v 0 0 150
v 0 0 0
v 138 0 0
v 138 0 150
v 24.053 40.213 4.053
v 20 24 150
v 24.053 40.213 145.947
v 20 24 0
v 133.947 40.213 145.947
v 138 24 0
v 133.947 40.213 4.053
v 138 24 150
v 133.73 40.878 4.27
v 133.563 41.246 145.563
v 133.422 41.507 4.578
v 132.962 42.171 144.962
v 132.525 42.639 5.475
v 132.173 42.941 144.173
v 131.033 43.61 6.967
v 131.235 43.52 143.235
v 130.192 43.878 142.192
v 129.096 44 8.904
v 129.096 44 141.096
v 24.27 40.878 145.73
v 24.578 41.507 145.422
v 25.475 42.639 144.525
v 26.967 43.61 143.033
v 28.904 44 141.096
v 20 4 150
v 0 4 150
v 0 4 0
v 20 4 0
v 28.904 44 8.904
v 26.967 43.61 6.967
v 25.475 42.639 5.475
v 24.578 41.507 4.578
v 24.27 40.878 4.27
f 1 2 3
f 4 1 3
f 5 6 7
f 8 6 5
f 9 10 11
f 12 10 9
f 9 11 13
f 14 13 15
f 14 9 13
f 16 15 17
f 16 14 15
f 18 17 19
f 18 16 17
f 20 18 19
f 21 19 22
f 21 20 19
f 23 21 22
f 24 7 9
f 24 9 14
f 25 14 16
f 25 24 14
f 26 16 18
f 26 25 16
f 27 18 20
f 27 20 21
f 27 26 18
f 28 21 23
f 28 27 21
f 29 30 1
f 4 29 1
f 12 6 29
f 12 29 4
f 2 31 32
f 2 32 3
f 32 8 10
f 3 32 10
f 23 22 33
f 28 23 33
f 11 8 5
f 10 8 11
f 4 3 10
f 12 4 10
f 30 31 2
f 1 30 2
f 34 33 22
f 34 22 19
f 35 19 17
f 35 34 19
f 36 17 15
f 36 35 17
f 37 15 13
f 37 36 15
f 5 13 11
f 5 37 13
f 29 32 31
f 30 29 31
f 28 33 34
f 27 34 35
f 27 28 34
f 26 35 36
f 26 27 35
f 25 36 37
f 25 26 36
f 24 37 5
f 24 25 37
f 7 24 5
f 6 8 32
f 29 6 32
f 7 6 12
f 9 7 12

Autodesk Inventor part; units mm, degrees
ref_plane "YZ Plane" through (0, 0, 0) normal (1, 0, 0) x (0, 1, 0)
ref_plane "XZ Plane" through (0, 0, 0) normal (0, 1, 0) x (-1, 0, 0)
ref_plane "XY Plane" through (0, 0, 0) normal (0, 0, 1) x (1, 0, 0)
sketch "スケッチ1" plane through (0, 0, 0) normal (0, 0, 1) x (1, 0, 0)
  line L0 (0, 0) -> (138, 0)
  line L1 (138, 0) -> (138, 44)
  line L2 (138, 44) -> (20, 44)
  line L3 (20, 44) -> (20, 4)
  line L4 (20, 4) -> (0, 4)
  line L5 (0, 4) -> (0, 0)
  dimension "d0" = 20
  dimension "d1" = 4
  dimension "d2" = 40
  dimension "d3" = 118
extrude "押し出し1" add sketch "スケッチ1" along normal blind 150
chamfer "面取り1" distance 5 distance2 20 1 edges at (20, 44, 75) measured on face at (98.6667, 44, 50)
chamfer "面取り2" distance 5 distance2 20 1 edges at (81.5, 44, 0) measured on face at (100.3333, 44, 50)
chamfer "面取り3" distance 5 distance2 20 1 edges at (138, 44, 77.5) measured on face at (100.3333, 44, 53.3333)
chamfer "面取り4" distance 5 distance2 20 1 edges at (79, 44, 150) measured on face at (97, 44, 101.6667)
fillet "フィレット1" radius 5 4 edges at (79, 44, 5) (25, 44, 75) (79, 44, 145) (133, 44, 75)
properties part number "おもり"
